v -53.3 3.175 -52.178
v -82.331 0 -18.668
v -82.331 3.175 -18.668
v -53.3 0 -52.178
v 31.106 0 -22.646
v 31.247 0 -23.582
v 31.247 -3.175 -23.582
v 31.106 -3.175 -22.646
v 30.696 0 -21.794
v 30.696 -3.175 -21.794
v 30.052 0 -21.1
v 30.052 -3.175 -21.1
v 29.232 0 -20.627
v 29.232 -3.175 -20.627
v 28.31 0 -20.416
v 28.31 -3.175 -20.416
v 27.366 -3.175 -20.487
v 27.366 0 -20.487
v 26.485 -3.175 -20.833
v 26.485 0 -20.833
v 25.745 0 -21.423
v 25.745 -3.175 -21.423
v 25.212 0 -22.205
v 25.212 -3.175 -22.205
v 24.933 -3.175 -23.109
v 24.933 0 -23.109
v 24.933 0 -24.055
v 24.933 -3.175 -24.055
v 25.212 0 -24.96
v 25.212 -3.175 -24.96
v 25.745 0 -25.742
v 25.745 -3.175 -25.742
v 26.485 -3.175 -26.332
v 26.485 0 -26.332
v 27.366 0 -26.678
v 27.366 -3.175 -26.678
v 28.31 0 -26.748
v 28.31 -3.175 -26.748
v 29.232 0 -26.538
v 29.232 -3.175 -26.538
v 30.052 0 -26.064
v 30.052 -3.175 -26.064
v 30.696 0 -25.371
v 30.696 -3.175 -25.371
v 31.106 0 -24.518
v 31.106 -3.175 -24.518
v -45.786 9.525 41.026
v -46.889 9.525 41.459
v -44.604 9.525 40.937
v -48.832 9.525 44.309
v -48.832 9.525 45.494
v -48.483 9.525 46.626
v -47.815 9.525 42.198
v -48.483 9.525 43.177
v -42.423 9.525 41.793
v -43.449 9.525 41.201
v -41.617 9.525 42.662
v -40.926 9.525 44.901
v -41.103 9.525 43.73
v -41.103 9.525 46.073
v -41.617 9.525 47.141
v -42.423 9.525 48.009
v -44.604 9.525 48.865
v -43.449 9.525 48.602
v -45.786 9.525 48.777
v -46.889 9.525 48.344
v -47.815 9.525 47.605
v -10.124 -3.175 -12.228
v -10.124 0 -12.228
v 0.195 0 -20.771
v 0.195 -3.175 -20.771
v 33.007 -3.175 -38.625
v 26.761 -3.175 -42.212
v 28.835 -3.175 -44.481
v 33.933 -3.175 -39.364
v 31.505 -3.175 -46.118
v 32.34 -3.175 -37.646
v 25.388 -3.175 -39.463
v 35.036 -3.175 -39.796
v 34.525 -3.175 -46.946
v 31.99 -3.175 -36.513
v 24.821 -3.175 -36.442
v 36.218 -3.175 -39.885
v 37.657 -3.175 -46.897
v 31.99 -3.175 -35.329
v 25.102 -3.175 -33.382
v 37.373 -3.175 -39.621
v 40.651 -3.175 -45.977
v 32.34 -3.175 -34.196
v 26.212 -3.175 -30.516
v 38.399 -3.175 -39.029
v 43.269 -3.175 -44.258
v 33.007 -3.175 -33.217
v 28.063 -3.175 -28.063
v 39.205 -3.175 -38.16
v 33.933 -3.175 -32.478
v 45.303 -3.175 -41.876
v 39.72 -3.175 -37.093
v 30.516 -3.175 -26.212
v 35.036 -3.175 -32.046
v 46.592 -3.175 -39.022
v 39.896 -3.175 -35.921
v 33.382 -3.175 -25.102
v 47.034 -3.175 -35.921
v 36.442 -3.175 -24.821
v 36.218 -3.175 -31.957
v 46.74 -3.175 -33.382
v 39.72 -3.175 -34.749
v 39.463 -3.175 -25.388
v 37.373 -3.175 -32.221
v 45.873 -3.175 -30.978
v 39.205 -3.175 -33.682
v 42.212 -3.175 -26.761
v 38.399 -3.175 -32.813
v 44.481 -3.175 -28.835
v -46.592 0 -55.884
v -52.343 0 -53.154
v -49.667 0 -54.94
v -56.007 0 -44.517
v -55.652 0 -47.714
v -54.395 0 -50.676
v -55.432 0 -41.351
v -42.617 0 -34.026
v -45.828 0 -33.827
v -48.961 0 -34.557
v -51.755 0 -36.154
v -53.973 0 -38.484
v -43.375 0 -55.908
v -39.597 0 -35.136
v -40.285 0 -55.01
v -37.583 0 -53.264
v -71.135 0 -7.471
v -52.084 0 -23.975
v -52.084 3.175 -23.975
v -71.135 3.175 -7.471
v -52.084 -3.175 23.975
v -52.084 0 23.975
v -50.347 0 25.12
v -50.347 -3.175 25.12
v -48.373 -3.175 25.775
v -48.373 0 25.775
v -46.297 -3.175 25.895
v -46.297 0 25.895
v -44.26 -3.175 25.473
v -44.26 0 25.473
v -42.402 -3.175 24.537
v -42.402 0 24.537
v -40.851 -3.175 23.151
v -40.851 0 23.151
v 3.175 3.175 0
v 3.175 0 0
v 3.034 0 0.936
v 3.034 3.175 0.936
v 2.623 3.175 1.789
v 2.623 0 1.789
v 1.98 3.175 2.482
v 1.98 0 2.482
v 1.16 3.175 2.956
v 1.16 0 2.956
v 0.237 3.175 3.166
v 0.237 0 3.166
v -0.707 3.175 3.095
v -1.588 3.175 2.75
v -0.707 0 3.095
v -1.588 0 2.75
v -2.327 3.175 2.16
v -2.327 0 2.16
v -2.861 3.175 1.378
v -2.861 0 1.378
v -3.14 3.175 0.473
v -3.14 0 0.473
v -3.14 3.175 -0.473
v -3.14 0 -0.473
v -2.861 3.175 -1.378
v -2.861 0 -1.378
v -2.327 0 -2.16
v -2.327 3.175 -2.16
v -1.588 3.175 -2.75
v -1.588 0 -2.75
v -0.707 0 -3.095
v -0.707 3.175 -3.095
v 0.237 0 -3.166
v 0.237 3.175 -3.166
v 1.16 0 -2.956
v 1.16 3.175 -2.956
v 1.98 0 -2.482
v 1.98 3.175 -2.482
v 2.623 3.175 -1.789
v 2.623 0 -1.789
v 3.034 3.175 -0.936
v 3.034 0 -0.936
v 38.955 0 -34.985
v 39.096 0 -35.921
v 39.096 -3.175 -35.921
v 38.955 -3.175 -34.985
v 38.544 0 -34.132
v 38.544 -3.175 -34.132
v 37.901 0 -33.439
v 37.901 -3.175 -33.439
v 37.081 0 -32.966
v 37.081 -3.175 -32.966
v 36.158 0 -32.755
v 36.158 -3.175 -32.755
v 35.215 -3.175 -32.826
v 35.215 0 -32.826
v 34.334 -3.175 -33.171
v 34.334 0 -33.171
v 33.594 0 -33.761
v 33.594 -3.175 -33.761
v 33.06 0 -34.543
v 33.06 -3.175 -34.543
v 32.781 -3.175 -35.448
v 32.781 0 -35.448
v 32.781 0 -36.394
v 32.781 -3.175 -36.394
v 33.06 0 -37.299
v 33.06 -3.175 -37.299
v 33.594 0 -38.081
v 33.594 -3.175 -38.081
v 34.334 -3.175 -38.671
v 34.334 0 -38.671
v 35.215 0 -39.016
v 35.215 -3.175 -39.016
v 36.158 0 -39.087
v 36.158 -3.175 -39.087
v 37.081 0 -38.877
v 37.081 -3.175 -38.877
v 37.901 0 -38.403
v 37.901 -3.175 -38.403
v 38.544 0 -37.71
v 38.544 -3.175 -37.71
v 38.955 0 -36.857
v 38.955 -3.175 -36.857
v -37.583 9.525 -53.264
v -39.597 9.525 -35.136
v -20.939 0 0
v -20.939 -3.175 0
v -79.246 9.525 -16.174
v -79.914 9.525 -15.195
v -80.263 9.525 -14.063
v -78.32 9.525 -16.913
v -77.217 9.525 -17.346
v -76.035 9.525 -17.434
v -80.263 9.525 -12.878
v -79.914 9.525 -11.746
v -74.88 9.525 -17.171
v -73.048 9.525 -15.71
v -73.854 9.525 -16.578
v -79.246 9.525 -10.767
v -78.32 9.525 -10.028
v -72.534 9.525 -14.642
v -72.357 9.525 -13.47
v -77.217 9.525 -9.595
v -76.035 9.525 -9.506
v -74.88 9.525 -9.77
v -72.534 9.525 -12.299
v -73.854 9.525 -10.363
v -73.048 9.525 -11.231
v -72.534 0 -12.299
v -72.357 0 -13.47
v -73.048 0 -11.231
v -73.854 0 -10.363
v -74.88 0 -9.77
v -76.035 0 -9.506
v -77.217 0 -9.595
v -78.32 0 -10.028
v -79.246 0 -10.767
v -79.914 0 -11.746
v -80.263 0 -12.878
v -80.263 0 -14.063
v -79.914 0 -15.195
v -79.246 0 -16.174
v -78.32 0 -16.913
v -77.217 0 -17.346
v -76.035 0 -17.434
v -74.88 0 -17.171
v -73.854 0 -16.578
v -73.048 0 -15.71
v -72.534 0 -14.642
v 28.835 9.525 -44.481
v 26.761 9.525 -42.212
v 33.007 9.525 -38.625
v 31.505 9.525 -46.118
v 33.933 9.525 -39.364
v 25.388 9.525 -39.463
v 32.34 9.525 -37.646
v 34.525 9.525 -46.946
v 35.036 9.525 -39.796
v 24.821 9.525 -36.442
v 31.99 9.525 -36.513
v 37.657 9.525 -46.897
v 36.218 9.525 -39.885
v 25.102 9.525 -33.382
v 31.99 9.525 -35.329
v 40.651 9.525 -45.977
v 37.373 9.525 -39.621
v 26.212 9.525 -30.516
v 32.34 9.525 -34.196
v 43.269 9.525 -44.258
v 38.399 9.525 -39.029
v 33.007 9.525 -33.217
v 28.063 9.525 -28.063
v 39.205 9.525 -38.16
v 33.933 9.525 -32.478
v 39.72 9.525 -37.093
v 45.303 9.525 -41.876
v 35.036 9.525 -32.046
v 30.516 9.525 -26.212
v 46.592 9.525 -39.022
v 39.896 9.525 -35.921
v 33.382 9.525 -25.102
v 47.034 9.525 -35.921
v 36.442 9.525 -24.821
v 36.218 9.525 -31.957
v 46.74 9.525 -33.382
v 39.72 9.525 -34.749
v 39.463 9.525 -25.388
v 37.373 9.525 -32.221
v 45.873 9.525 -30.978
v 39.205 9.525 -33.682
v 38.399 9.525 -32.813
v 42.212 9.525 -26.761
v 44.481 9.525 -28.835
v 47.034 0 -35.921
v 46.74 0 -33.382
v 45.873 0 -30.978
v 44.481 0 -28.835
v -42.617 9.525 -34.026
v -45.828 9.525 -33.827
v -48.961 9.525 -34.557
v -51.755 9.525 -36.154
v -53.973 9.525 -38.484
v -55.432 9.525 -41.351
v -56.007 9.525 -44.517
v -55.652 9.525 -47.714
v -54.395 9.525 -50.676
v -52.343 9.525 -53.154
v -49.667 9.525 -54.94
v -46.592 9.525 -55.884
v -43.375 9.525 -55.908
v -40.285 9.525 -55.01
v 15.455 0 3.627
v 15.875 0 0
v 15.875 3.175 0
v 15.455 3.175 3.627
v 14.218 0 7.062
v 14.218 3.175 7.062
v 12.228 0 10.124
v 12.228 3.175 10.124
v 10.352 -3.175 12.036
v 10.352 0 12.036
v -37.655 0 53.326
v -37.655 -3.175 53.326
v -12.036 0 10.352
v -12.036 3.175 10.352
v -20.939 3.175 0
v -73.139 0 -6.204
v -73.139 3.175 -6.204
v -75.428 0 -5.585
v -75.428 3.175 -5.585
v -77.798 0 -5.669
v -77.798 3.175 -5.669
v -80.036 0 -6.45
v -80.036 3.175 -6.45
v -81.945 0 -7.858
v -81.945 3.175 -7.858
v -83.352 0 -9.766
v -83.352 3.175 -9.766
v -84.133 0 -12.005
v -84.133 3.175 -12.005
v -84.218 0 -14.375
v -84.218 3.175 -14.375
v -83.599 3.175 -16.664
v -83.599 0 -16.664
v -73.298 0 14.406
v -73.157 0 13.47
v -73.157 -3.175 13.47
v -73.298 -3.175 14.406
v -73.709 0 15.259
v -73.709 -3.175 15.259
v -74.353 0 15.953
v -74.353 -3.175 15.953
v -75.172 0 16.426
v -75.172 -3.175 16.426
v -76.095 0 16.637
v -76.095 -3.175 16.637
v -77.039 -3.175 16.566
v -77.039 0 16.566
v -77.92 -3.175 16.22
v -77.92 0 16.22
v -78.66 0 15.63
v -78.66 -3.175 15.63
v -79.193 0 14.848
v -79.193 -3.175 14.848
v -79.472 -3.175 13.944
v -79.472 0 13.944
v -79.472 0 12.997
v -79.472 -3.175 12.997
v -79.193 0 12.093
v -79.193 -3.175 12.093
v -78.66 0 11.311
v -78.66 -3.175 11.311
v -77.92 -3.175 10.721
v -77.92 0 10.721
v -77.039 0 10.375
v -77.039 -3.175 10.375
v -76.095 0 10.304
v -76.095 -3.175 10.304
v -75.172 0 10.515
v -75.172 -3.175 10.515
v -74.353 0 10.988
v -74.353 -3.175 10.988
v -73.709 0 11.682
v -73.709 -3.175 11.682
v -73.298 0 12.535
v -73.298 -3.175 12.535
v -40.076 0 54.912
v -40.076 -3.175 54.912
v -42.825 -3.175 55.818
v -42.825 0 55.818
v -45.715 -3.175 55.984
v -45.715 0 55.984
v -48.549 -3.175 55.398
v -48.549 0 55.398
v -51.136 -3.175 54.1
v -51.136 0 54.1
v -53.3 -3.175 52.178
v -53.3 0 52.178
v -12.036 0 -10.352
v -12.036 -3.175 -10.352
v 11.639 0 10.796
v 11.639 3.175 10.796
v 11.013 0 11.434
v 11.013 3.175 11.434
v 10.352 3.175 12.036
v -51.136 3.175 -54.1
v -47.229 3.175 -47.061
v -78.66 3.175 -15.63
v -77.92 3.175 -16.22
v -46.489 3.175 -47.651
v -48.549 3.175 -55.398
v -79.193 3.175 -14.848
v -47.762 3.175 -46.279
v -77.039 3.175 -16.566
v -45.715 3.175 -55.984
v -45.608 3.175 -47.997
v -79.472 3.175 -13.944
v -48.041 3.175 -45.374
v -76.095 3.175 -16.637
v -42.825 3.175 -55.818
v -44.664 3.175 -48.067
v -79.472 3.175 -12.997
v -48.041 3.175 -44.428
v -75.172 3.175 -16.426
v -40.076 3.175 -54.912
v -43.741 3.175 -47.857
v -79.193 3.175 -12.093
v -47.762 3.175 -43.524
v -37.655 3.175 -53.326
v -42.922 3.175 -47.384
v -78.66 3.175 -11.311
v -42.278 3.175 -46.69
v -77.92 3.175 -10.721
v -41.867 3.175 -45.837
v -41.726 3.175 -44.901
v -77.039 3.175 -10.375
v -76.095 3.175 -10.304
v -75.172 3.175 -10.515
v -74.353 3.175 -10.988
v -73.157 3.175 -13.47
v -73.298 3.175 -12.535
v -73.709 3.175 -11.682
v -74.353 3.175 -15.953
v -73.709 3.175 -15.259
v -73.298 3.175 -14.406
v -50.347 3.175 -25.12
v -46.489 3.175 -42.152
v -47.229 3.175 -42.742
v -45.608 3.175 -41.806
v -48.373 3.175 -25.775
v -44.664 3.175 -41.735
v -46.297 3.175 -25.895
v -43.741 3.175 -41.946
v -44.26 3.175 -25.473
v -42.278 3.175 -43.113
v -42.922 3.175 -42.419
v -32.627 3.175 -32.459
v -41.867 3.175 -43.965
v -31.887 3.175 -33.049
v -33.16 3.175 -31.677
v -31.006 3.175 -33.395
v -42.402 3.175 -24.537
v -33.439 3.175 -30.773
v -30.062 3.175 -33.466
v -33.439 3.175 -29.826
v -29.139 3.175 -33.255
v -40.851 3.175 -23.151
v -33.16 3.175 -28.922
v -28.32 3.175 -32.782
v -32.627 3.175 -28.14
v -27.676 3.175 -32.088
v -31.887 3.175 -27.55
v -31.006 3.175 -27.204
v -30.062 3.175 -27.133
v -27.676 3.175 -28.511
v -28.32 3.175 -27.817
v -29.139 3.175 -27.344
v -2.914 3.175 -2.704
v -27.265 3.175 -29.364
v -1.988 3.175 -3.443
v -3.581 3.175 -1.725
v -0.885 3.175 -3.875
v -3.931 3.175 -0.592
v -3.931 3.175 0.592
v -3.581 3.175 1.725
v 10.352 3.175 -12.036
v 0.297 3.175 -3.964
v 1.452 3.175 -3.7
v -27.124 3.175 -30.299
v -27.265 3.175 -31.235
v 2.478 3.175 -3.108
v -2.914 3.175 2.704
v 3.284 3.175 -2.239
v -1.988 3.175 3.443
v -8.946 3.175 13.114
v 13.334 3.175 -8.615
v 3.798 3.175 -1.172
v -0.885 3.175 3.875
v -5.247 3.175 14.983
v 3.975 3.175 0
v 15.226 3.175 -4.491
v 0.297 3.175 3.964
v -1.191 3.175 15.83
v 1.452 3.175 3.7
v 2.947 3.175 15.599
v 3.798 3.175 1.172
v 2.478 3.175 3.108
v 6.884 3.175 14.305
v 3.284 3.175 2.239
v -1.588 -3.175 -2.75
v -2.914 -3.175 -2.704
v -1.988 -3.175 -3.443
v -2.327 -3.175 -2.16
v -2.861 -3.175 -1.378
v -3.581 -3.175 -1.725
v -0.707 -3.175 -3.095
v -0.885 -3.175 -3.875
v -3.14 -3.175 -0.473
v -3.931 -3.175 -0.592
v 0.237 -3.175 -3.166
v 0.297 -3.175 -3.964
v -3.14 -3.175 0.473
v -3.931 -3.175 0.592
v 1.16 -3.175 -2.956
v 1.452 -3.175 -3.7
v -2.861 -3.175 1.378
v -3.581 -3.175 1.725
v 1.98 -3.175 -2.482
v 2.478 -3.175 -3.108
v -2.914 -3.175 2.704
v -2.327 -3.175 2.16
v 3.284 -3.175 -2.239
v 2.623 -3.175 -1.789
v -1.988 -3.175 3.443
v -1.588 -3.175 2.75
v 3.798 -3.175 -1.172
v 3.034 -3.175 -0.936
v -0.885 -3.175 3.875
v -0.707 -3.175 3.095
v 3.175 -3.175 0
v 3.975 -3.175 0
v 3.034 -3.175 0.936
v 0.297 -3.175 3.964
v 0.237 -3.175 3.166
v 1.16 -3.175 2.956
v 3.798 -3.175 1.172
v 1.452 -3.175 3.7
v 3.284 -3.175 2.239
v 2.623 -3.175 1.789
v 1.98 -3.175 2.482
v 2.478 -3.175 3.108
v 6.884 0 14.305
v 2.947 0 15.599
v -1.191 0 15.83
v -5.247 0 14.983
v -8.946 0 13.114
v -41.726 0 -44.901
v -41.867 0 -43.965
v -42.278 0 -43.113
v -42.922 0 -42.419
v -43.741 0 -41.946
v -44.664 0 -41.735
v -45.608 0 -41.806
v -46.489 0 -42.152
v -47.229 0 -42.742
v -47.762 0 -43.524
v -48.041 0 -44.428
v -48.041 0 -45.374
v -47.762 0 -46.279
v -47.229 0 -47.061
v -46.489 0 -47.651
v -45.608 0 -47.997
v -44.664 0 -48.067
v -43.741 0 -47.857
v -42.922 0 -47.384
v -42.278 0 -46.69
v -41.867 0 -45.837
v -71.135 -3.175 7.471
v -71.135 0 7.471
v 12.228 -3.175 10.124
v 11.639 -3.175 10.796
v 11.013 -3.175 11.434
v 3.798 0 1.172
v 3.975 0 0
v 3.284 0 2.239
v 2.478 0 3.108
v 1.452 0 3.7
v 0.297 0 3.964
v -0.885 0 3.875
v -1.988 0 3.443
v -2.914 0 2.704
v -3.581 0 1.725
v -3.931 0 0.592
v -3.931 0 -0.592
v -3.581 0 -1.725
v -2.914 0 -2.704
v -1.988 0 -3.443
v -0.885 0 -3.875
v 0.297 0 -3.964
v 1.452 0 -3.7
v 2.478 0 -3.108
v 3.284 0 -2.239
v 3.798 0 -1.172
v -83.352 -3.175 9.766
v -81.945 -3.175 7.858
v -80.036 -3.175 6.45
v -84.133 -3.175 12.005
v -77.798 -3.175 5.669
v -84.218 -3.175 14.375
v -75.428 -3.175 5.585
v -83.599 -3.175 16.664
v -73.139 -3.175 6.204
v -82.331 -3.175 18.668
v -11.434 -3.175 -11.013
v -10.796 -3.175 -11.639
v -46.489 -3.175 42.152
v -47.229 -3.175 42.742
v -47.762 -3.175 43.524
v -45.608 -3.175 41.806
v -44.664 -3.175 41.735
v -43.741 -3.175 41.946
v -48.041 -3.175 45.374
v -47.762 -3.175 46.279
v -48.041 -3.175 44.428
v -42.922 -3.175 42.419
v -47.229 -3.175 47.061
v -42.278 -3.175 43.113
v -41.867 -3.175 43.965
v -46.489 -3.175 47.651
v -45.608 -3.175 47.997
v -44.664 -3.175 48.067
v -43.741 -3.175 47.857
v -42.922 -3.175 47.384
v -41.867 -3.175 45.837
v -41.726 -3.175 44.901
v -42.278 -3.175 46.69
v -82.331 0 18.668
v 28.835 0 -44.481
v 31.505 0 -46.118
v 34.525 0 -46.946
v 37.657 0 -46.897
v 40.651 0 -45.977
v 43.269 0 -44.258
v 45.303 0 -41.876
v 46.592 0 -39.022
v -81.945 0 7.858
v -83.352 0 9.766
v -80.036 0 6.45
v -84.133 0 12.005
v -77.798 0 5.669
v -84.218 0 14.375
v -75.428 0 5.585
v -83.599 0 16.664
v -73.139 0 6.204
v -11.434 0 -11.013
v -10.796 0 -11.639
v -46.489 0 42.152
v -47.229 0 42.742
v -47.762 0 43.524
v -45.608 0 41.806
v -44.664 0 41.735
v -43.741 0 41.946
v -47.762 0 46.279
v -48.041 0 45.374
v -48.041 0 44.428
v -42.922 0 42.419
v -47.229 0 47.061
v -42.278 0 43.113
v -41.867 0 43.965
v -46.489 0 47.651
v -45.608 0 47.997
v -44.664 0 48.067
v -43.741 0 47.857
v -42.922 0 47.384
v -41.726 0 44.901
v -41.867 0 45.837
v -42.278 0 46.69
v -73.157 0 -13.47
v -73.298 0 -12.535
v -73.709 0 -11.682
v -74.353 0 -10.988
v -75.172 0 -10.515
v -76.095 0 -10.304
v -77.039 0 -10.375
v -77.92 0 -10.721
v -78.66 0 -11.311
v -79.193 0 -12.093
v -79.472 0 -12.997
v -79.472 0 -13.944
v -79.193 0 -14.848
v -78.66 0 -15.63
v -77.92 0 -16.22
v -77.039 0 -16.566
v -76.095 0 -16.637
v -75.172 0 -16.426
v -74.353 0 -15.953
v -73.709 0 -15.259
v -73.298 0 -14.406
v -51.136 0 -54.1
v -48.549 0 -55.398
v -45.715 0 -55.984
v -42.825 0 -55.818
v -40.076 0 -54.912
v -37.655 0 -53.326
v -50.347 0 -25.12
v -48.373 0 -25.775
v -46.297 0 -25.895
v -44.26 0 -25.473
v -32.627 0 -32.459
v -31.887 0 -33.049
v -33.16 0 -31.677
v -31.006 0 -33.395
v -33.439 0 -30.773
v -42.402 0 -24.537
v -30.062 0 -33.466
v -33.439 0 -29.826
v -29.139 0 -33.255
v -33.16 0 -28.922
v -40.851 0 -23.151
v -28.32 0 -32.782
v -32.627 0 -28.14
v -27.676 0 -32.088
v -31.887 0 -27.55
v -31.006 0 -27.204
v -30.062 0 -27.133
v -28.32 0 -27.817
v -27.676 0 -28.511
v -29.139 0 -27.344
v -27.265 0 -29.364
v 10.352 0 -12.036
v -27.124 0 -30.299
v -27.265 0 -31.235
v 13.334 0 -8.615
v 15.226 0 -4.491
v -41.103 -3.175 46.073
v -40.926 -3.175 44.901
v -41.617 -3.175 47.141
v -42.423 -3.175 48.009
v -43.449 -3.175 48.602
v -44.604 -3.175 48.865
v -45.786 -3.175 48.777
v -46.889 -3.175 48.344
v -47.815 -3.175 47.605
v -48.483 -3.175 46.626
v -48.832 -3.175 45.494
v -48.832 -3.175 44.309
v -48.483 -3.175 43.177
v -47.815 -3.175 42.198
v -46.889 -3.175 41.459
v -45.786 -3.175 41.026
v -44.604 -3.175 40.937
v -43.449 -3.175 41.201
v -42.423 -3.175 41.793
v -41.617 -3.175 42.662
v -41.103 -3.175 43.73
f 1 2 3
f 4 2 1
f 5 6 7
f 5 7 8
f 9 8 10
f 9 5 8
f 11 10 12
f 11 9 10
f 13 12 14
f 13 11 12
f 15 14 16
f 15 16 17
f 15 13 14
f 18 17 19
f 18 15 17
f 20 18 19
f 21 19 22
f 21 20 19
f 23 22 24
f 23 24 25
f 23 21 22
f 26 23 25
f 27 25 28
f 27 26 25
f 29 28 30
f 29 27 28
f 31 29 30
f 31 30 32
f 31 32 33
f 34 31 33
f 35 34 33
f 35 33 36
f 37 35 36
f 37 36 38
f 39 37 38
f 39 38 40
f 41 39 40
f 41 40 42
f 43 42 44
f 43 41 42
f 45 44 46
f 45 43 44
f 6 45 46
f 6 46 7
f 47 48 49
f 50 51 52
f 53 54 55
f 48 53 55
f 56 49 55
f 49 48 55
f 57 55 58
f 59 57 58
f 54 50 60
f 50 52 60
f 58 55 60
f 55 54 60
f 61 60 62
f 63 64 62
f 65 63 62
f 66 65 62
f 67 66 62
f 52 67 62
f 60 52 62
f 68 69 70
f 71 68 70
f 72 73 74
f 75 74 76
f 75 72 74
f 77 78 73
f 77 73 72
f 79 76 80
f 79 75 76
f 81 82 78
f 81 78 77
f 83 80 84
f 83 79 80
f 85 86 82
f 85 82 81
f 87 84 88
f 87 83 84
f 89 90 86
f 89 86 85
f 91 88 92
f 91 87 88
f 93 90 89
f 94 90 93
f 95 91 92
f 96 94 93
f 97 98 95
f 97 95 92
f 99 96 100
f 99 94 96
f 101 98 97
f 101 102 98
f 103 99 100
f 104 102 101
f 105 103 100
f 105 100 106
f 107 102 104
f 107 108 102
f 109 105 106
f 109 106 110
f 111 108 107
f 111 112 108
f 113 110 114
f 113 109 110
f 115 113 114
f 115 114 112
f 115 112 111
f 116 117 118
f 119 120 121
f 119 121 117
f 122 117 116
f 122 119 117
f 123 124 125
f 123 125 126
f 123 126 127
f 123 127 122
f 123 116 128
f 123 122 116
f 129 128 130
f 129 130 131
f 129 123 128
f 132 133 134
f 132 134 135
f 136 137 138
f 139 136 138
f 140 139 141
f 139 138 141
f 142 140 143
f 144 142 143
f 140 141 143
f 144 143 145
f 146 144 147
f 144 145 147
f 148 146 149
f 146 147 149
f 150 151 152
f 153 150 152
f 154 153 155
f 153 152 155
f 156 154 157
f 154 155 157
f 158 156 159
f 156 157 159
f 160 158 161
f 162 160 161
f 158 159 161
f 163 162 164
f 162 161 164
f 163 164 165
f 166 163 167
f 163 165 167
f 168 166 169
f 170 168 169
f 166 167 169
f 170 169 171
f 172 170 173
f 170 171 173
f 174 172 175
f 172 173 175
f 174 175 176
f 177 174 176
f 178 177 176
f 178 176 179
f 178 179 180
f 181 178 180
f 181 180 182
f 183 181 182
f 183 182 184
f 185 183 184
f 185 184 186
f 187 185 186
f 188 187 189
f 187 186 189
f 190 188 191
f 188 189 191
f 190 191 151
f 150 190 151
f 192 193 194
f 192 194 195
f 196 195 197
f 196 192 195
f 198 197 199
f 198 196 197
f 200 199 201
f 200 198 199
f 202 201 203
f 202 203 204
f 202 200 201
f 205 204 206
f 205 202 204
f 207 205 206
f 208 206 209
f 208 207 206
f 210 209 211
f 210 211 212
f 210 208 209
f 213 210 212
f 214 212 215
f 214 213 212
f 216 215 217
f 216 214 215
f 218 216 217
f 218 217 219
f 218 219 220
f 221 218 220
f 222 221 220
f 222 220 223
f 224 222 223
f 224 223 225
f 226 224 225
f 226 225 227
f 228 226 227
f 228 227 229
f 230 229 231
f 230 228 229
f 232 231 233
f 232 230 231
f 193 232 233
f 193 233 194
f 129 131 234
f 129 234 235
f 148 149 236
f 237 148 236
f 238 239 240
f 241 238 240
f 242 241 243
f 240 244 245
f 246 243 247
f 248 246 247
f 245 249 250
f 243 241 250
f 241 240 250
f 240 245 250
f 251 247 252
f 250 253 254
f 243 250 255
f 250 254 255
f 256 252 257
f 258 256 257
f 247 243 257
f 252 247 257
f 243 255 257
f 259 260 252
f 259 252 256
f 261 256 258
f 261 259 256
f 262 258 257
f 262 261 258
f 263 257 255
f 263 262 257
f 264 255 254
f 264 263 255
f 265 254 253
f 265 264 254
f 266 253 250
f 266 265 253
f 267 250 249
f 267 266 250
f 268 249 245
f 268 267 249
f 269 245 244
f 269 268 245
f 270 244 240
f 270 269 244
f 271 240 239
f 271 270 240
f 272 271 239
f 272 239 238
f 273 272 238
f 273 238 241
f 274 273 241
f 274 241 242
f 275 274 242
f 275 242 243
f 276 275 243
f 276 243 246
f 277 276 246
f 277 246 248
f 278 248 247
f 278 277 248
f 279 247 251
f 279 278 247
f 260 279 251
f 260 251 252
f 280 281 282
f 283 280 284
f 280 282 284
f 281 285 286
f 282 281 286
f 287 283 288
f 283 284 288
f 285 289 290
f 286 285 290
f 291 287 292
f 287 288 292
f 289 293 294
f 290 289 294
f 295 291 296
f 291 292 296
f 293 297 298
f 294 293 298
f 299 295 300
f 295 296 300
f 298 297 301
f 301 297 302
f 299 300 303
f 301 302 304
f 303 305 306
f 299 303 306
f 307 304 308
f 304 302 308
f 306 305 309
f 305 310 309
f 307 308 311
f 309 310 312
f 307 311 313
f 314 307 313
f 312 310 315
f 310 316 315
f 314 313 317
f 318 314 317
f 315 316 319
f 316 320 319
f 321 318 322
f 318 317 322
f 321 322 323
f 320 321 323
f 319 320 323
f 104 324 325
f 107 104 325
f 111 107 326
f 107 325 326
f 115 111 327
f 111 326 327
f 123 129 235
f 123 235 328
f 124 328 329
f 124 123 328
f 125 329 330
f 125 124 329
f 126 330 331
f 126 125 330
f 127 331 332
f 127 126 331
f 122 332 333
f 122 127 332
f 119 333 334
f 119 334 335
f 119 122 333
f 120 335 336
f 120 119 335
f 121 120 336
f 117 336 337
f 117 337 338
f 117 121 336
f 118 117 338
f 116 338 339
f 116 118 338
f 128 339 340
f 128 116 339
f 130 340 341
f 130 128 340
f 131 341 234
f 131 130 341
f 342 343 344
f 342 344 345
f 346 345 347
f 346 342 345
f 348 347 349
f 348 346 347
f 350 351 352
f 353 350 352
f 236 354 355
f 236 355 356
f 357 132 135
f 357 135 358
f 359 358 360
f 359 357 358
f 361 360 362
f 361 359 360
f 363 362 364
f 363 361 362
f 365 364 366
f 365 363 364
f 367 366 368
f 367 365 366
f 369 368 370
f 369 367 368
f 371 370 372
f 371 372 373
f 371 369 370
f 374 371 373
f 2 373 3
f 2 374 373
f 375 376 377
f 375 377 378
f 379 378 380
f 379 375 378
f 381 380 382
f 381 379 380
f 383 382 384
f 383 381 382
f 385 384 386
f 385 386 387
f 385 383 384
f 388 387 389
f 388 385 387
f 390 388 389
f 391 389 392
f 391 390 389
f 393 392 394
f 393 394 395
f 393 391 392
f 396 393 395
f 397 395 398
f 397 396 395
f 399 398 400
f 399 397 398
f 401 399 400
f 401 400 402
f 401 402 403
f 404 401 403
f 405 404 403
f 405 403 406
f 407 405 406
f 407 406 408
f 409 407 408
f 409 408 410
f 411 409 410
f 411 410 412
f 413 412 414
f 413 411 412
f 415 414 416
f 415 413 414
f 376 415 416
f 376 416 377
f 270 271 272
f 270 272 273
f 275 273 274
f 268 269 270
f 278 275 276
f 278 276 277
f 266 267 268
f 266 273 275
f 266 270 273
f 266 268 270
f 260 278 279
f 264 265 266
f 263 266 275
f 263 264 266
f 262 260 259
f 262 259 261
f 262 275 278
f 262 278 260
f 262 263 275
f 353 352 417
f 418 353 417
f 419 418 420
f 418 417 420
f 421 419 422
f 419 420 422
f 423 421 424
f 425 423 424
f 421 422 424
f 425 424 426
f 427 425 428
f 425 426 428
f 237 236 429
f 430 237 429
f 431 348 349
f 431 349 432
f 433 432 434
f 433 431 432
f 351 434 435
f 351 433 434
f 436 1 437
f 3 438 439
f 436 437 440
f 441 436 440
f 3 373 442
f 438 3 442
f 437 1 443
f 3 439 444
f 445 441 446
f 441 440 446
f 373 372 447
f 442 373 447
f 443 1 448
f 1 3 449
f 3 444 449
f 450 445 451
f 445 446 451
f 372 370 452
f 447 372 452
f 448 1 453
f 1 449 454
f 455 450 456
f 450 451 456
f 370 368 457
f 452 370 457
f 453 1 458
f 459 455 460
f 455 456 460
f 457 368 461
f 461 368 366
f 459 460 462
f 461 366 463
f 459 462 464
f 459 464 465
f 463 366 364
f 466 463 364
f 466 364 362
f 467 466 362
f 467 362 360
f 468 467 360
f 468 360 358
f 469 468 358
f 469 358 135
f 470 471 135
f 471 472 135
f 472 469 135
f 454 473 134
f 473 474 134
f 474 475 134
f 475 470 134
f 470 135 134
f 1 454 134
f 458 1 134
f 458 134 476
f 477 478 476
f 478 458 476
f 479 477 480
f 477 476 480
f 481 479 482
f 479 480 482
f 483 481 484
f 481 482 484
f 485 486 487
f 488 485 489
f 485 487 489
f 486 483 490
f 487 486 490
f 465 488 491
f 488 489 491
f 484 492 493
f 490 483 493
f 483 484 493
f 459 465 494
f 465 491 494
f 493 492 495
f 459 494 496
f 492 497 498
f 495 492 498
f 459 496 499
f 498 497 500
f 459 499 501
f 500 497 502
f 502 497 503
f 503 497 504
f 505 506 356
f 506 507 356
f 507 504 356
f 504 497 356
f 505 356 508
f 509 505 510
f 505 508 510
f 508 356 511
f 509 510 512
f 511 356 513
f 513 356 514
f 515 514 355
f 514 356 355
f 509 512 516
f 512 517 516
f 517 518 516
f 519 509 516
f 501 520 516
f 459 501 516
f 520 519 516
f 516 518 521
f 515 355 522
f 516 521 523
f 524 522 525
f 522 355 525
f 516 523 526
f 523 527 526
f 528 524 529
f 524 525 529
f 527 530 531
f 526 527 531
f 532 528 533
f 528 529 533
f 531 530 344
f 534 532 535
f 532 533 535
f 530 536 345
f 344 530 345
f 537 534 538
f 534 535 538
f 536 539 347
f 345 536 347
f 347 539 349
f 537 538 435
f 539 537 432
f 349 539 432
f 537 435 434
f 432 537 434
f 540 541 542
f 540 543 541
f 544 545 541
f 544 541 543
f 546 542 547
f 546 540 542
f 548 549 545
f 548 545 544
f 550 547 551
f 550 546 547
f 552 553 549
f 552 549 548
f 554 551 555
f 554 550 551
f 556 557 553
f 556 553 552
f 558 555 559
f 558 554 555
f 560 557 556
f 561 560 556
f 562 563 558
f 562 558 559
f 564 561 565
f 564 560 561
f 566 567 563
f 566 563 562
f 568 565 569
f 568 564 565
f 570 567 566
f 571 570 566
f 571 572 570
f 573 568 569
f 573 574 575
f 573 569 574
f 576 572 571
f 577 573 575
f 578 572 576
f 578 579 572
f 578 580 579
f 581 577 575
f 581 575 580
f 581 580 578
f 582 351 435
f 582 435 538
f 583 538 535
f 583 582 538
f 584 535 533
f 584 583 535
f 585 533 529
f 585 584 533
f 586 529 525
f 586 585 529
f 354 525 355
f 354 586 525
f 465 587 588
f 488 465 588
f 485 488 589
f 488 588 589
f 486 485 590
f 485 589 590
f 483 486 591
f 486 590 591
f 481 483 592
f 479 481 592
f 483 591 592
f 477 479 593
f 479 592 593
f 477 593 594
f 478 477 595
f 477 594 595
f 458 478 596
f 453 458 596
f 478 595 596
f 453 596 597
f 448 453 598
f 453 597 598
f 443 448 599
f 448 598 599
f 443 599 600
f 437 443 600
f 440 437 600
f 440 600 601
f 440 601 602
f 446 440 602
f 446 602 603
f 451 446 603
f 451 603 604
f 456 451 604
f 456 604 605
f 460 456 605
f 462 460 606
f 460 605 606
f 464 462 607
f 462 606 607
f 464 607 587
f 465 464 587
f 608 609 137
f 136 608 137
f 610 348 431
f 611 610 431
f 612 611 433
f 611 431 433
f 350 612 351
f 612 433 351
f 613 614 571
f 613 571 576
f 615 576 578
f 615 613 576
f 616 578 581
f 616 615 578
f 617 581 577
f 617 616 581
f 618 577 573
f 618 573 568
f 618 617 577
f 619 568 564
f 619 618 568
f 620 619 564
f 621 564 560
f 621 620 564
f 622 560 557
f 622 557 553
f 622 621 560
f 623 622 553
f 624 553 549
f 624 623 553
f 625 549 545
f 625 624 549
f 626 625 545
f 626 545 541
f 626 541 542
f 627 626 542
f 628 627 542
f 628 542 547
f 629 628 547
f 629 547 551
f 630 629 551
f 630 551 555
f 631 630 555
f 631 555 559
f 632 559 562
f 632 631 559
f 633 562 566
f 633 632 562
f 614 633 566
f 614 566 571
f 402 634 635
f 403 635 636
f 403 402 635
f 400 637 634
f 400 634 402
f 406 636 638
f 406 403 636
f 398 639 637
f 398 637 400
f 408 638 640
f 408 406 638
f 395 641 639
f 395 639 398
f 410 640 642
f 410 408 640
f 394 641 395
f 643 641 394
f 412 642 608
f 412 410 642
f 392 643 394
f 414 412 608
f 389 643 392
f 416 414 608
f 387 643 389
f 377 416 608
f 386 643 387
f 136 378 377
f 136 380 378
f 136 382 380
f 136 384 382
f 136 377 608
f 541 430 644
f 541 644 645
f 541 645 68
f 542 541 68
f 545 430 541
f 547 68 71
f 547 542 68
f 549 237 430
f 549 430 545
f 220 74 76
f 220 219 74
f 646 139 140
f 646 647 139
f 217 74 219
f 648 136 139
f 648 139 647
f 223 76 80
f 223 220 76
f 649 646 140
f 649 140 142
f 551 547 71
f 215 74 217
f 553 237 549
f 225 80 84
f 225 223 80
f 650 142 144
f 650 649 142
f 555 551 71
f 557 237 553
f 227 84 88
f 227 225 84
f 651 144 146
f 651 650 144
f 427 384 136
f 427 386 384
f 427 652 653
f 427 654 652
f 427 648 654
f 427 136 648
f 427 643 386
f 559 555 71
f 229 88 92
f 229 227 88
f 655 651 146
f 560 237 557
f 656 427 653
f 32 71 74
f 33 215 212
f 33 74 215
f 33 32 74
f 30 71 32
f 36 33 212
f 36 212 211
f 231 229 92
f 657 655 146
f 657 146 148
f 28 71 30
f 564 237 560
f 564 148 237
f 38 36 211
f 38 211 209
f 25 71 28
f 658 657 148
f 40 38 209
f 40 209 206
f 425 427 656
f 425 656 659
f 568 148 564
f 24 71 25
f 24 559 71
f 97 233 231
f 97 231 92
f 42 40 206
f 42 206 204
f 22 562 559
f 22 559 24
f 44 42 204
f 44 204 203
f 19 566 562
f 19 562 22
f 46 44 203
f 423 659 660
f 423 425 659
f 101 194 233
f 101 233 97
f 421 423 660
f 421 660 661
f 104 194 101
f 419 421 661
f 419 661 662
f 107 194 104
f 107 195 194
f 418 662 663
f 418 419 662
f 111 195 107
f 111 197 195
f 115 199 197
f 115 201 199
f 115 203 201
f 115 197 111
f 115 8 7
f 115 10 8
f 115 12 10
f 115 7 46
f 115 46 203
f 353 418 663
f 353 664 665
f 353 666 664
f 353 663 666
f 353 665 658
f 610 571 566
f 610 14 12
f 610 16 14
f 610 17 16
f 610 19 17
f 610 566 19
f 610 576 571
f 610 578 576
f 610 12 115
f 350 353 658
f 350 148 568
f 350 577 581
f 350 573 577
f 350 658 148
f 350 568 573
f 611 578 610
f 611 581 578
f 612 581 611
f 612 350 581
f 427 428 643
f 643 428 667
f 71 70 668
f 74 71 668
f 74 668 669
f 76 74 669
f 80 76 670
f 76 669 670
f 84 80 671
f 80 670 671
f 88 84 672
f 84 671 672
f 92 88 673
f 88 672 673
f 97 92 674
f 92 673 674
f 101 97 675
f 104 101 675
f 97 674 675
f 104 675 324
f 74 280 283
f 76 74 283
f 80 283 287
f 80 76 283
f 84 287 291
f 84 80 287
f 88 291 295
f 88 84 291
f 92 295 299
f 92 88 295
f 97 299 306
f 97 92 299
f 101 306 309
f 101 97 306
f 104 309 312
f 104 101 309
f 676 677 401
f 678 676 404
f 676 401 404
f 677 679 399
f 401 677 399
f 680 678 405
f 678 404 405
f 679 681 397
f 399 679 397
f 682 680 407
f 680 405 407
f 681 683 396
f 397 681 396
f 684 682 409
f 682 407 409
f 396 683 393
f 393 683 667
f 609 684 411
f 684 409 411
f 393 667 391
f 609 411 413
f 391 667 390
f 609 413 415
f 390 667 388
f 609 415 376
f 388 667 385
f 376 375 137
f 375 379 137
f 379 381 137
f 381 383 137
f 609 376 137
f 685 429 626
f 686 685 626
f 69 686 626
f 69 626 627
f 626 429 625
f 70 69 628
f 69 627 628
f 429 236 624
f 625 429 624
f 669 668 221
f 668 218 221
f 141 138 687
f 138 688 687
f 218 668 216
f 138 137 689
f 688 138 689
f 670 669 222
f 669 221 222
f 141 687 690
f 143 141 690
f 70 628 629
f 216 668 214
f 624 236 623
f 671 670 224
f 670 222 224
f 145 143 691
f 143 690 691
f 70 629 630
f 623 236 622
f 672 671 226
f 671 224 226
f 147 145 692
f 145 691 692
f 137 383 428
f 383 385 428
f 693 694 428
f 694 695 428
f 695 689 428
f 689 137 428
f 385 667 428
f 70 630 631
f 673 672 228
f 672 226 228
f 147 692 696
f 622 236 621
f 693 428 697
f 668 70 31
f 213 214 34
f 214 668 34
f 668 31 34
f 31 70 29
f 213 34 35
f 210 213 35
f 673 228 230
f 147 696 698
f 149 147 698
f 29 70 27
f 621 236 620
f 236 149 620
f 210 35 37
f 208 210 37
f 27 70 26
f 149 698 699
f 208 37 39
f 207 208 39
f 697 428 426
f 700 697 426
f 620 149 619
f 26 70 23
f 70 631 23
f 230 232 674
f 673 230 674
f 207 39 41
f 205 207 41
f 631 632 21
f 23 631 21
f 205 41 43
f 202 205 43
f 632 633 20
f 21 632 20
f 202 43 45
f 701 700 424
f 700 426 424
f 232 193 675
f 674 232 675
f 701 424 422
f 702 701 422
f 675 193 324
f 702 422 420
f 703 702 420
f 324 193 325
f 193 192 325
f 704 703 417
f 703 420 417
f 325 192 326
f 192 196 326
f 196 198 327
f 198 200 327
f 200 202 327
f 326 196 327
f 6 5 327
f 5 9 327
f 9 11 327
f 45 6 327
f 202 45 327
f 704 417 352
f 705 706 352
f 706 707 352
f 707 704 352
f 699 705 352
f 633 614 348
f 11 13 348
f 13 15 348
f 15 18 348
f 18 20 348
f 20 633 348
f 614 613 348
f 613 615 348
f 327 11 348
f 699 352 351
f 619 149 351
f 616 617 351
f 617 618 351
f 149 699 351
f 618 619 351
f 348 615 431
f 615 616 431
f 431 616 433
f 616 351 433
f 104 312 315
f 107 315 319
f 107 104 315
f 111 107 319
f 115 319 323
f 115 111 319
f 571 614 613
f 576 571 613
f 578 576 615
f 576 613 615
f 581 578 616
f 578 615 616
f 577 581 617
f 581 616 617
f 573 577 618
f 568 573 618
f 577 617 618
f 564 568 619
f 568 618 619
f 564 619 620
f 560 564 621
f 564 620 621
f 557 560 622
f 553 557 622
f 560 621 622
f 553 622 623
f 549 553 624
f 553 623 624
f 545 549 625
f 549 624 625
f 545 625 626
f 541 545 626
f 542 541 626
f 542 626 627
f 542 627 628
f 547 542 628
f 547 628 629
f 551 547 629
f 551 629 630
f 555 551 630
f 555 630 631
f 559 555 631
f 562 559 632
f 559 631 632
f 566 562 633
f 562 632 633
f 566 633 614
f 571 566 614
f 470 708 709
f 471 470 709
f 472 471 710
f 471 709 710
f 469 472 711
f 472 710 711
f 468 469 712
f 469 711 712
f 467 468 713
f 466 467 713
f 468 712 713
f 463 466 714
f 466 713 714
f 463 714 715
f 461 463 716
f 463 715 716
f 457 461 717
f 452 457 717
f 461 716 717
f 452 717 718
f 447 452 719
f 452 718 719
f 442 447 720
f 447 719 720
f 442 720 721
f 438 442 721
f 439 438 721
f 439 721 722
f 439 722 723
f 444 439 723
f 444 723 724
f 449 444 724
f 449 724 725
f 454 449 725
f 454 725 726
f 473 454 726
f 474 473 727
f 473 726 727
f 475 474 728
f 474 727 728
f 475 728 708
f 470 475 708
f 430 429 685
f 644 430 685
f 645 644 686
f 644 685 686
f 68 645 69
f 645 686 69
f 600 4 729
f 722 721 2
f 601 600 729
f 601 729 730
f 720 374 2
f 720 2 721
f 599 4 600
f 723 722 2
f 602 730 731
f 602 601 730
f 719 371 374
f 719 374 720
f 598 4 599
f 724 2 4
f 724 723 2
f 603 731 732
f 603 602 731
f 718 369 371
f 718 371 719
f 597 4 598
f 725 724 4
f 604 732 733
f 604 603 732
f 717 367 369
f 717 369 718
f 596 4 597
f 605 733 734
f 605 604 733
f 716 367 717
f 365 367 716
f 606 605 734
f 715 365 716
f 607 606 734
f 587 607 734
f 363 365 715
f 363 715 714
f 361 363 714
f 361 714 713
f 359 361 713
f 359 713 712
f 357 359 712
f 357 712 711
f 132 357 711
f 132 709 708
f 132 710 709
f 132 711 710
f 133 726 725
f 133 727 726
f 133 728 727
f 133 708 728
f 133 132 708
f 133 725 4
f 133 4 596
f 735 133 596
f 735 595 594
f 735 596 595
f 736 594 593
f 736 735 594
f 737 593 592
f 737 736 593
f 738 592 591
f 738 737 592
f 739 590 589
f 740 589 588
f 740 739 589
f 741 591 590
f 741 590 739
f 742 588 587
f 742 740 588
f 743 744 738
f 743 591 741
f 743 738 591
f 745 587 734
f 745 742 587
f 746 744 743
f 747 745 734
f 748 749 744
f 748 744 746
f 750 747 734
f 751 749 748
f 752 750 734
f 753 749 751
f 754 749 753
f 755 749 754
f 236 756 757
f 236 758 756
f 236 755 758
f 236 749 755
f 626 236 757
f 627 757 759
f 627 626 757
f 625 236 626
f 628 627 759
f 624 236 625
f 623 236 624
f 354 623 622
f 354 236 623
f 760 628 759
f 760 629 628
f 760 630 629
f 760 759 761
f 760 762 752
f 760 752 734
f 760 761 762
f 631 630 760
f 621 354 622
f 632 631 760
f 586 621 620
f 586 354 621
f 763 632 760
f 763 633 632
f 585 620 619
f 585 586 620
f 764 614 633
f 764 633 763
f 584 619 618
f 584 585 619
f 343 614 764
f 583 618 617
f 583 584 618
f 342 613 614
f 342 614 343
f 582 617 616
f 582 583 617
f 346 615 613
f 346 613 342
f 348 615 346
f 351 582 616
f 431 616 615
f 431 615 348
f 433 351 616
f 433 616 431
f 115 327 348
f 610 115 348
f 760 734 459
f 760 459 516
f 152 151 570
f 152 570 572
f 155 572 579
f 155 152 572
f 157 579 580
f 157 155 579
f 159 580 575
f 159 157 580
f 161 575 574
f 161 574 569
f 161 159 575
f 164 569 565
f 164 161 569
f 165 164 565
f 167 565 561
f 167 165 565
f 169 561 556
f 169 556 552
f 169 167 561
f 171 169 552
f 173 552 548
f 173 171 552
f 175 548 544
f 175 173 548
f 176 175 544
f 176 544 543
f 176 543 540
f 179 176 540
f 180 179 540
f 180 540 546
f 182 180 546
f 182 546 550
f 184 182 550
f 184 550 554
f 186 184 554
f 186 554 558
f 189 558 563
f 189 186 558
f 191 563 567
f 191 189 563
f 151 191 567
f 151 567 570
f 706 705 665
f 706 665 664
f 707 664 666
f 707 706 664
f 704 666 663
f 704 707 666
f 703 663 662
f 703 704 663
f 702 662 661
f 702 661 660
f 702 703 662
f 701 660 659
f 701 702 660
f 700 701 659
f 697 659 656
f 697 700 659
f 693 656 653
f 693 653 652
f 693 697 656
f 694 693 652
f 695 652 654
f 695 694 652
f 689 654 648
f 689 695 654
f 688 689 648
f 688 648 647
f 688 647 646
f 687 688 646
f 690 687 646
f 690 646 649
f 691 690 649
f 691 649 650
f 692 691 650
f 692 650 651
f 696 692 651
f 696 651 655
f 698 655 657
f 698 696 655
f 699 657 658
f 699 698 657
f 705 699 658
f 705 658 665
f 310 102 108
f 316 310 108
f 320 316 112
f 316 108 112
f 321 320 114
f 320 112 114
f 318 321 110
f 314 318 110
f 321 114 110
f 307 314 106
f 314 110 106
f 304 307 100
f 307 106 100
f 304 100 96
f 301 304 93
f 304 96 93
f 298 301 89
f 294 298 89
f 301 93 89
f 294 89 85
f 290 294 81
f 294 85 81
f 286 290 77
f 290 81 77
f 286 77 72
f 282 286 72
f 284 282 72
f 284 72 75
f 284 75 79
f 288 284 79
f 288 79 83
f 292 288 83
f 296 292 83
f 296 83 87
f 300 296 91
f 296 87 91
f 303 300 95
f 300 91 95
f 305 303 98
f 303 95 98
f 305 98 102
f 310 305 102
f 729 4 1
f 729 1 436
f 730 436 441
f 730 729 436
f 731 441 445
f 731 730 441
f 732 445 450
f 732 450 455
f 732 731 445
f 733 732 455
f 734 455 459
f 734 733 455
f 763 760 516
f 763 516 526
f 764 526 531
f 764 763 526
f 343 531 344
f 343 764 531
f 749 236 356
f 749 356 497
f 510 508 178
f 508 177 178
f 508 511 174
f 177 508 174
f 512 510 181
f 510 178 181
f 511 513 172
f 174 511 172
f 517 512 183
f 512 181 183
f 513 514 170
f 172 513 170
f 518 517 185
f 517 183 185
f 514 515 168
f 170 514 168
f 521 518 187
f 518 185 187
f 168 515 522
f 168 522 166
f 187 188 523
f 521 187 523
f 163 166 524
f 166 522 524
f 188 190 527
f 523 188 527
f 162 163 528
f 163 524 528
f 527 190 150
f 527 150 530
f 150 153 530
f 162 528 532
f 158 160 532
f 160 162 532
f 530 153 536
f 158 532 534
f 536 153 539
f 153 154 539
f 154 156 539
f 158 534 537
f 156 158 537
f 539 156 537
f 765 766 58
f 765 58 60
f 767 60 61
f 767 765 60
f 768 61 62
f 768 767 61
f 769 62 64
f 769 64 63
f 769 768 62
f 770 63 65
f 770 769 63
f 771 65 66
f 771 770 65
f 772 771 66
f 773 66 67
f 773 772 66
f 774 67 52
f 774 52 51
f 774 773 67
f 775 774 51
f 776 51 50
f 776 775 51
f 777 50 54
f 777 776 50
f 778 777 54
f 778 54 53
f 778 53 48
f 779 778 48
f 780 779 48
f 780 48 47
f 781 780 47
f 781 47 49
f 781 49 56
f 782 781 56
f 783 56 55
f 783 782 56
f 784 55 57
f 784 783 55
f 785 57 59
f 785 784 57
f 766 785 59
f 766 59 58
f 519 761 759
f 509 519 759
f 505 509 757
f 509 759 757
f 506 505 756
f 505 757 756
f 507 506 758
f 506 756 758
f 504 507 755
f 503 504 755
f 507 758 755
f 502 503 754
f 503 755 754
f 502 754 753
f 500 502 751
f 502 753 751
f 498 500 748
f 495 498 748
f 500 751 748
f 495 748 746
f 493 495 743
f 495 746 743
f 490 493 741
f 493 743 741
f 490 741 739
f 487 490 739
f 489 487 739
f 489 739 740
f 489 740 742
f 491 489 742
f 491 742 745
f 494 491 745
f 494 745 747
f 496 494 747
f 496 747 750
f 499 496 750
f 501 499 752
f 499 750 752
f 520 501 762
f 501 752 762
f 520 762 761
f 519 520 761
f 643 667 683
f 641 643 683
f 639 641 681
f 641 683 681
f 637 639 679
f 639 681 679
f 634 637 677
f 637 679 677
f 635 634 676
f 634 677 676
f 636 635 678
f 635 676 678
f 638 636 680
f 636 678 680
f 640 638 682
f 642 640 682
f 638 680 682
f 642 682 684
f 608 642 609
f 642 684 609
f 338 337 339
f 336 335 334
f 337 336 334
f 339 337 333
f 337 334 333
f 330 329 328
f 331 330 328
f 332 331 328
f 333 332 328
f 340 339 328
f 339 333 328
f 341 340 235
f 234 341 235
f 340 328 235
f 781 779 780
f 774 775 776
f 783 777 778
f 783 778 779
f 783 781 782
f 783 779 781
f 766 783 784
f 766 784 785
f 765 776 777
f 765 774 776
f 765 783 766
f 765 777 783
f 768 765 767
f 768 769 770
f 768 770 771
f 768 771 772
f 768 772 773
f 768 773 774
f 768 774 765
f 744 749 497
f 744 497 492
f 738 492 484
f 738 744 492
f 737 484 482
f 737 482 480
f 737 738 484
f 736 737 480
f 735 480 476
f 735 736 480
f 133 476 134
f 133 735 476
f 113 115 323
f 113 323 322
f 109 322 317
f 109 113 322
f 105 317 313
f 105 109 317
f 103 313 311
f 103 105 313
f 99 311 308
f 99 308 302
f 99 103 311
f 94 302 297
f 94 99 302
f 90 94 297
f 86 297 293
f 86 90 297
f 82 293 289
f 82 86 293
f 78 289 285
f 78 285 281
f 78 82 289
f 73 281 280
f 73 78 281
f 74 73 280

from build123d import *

# Parameters (mm, degrees)
F0_R          = 3.175
F0_R_2        = 3.9751
F1_DEPTH      = 3.175
F2_DEPTH      = 3.175
F3_DEPTH      = 3.175
F3_DEPTH_BACK = 3.175
F4_R          = 3.9751
F4_R_2        = 3.175
F6_DEPTH      = 12.7
F7_START      = -3.175
F7_DEPTH      = 9.525


with BuildPart() as f1:
    # F0 (on Front) → F1 (new body)
    with BuildSketch(Plane.XZ):
        with BuildLine():
            ThreePointArc((-12.0356034274, 10.3518054047), (-1.190625, 15.8302885984), (10.3518054047, 12.0356034274))
            Line((10.3518054047, 12.0356034274), (-37.655016822, 53.3262030046))
            ThreePointArc((-37.655016822, 53.3262030046), (-34.8014845049, 49.5361241819), (-33.7887806053, 44.9012806053))
            ThreePointArc((-33.7887806053, 44.9012806053), (-41.0369756168, 34.4823169714), (-53.3262030046, 37.655016822))
            ThreePointArc((-53.3262030046, 37.655016822), (-56.0137627922, 44.9211777548), (-53.300199871, 52.1776678558))
            Line((-53.300199871, 52.1776678558), (-82.331405076, 18.6678036462))
            ThreePointArc((-82.331405076, 18.6678036462), (-73.5586383483, 20.9075469092), (-68.3946770291, 13.4703841816))
            ThreePointArc((-68.3946770291, 13.4703841816), (-69.1121208226, 10.1727039932), (-71.1347575644, 7.4711561347))
            Line((-71.1347575644, 7.4711561347), (-52.0843267669, 23.9754595323))
            ThreePointArc((-52.0843267669, 23.9754595323), (-46.2965222838, 25.8954961667), (-40.8511612346, 23.1508168672))
            Line((-40.8511612346, 23.1508168672), (-20.9391765456, 0))
            Line((-20.9391765456, 0), (-12.0356034274, 10.3518054047))
        make_face()
        with BuildLine():
            ThreePointArc((28.8345692365, -44.4808030019), (28.0633003783, -28.0633003783), (44.4808030019, -28.8345692365))
            Line((44.4808030019, -28.8345692365), (12.2282550252, 10.1235074968))
            ThreePointArc((12.2282550252, 10.1235074968), (14.9355142785, 5.3801522504), (15.875, 0))
            ThreePointArc((15.875, 0), (14.4282801435, -6.6212051093), (10.3518054047, -12.0356034274))
            Line((10.3518054047, -12.0356034274), (0.1954344954, -20.7710836138))
            Line((0.1954344954, -20.7710836138), (28.8345692365, -44.4808030019))
        make_face()
        with Locations((28.0722806345, -23.5821525739)):
            Circle(F0_R, mode=Mode.SUBTRACT)
        with BuildLine():
            ThreePointArc((15.875, 0), (14.9355142785, 5.3801522504), (12.2282550252, 10.1235074968))
            ThreePointArc((12.2282550252, 10.1235074968), (11.3304373246, 11.1192092809), (10.3518054047, 12.0356034274))
            ThreePointArc((10.3518054047, 12.0356034274), (-1.190625, 15.8302885984), (-12.0356034274, 10.3518054047))
            ThreePointArc((-12.0356034274, 10.3518054047), (-15.875, 0), (-12.0356034274, -10.3518054047))
            ThreePointArc((-12.0356034274, -10.3518054047), (-11.1192092809, -11.3304373246), (-10.1235074968, -12.2282550252))
            ThreePointArc((-10.1235074968, -12.2282550252), (0.1493607821, -15.87429735), (10.3518054047, -12.0356034274))
            ThreePointArc((10.3518054047, -12.0356034274), (14.4282801435, -6.6212051093), (15.875, 0))
        make_face()
        Circle(F0_R_2, mode=Mode.SUBTRACT)
        with BuildLine():
            Line((-10.1235074968, -12.2282550252), (0.1954344954, -20.7710836138))
            Line((0.1954344954, -20.7710836138), (10.3518054047, -12.0356034274))
            ThreePointArc((10.3518054047, -12.0356034274), (0.1493607821, -15.87429735), (-10.1235074968, -12.2282550252))
        make_face()
        with BuildLine():
            ThreePointArc((-12.0356034274, -10.3518054047), (-15.875, 0), (-12.0356034274, 10.3518054047))
            Line((-12.0356034274, 10.3518054047), (-20.9391765456, 0))
            Line((-20.9391765456, 0), (-12.0356034274, -10.3518054047))
        make_face()
        with BuildLine():
            ThreePointArc((-33.7887806053, 44.9012806053), (-34.8014845049, 49.5361241819), (-37.655016822, 53.3262030046))
            ThreePointArc((-37.655016822, 53.3262030046), (-45.7148756595, 55.9839571475), (-53.300199871, 52.1776678558))
            ThreePointArc((-53.300199871, 52.1776678558), (-56.0137627922, 44.9211777548), (-53.3262030046, 37.655016822))
            ThreePointArc((-53.3262030046, 37.655016822), (-41.0369756168, 34.4823169714), (-33.7887806053, 44.9012806053))
        make_face()
        with Locations((-44.9012806053, 44.9012806053)):
            Circle(F0_R, mode=Mode.SUBTRACT)
        with BuildLine():
            ThreePointArc((-68.3946770291, 13.4703841816), (-73.5586383483, 20.9075469092), (-82.331405076, 18.6678036462))
            ThreePointArc((-82.331405076, 18.6678036462), (-81.9448371048, 7.8577241059), (-71.1347575644, 7.4711561347))
            ThreePointArc((-71.1347575644, 7.4711561347), (-69.1121208226, 10.1727039932), (-68.3946770291, 13.4703841816))
        make_face()
        with Locations((-76.3321770291, 13.4703841816)):
            Circle(F0_R, mode=Mode.SUBTRACT)
        with BuildLine():
            ThreePointArc((28.8345692365, -44.4808030019), (40.650687385, -45.9767663811), (47.0335244843, -35.9210244843))
            ThreePointArc((47.0335244843, -35.9210244843), (46.3758844792, -32.154917909), (44.4808030019, -28.8345692365))
            ThreePointArc((44.4808030019, -28.8345692365), (28.0633003783, -28.0633003783), (28.8345692365, -44.4808030019))
        make_face()
        with Locations((35.9210244843, -35.9210244843)):
            Circle(F0_R, mode=Mode.SUBTRACT)
    extrude(amount=F1_DEPTH)


with BuildPart() as f2:
    # F0 (on Front) → F2 (new body)
    with BuildSketch(Plane.XZ):
        with BuildLine():
            Line((-37.655016822, -53.3262030046), (0.1954344954, -20.7710836138))
            Line((0.1954344954, -20.7710836138), (-10.1235074968, -12.2282550252))
            ThreePointArc((-10.1235074968, -12.2282550252), (-11.1192092809, -11.3304373246), (-12.0356034274, -10.3518054047))
            Line((-12.0356034274, -10.3518054047), (-20.9391765456, 0))
            Line((-20.9391765456, 0), (-40.8511612346, -23.1508168672))
            ThreePointArc((-40.8511612346, -23.1508168672), (-46.2965222838, -25.8954961667), (-52.0843267669, -23.9754595323))
            Line((-52.0843267669, -23.9754595323), (-71.1347575644, -7.4711561347))
            ThreePointArc((-71.1347575644, -7.4711561347), (-69.1121208226, -10.1727039932), (-68.3946770291, -13.4703841816))
            ThreePointArc((-68.3946770291, -13.4703841816), (-73.5586383483, -20.9075469092), (-82.331405076, -18.6678036462))
            Line((-82.331405076, -18.6678036462), (-53.300199871, -52.1776678558))
            ThreePointArc((-53.300199871, -52.1776678558), (-56.0137627922, -44.9211777548), (-53.3262030046, -37.655016822))
            ThreePointArc((-53.3262030046, -37.655016822), (-41.0369756168, -34.4823169714), (-33.7887806053, -44.9012806053))
            ThreePointArc((-33.7887806053, -44.9012806053), (-34.8014845049, -49.5361241819), (-37.655016822, -53.3262030046))
        make_face()
        with Locations((-30.2993841525, -30.2993841525)):
            Circle(F0_R, mode=Mode.SUBTRACT)
        with BuildLine():
            ThreePointArc((-12.0356034274, -10.3518054047), (-15.875, 0), (-12.0356034274, 10.3518054047))
            Line((-12.0356034274, 10.3518054047), (-20.9391765456, 0))
            Line((-20.9391765456, 0), (-12.0356034274, -10.3518054047))
        make_face()
        with BuildLine():
            ThreePointArc((15.875, 0), (14.9355142785, 5.3801522504), (12.2282550252, 10.1235074968))
            ThreePointArc((12.2282550252, 10.1235074968), (11.3304373246, 11.1192092809), (10.3518054047, 12.0356034274))
            ThreePointArc((10.3518054047, 12.0356034274), (-1.190625, 15.8302885984), (-12.0356034274, 10.3518054047))
            ThreePointArc((-12.0356034274, 10.3518054047), (-15.875, 0), (-12.0356034274, -10.3518054047))
            ThreePointArc((-12.0356034274, -10.3518054047), (-11.1192092809, -11.3304373246), (-10.1235074968, -12.2282550252))
            ThreePointArc((-10.1235074968, -12.2282550252), (0.1493607821, -15.87429735), (10.3518054047, -12.0356034274))
            ThreePointArc((10.3518054047, -12.0356034274), (14.4282801435, -6.6212051093), (15.875, 0))
        make_face()
        Circle(F0_R_2, mode=Mode.SUBTRACT)
        with BuildLine():
            ThreePointArc((-53.300199871, -52.1776678558), (-45.7148756595, -55.9839571475), (-37.655016822, -53.3262030046))
            ThreePointArc((-37.655016822, -53.3262030046), (-34.8014845049, -49.5361241819), (-33.7887806053, -44.9012806053))
            ThreePointArc((-33.7887806053, -44.9012806053), (-41.0369756168, -34.4823169714), (-53.3262030046, -37.655016822))
            ThreePointArc((-53.3262030046, -37.655016822), (-56.0137627922, -44.9211777548), (-53.300199871, -52.1776678558))
        make_face()
        with Locations((-44.9012806053, -44.9012806053)):
            Circle(F0_R, mode=Mode.SUBTRACT)
        with BuildLine():
            ThreePointArc((-71.1347575644, -7.4711561347), (-81.9448371048, -7.8577241059), (-82.331405076, -18.6678036462))
            ThreePointArc((-82.331405076, -18.6678036462), (-73.5586383483, -20.9075469092), (-68.3946770291, -13.4703841816))
            ThreePointArc((-68.3946770291, -13.4703841816), (-69.1121208226, -10.1727039932), (-71.1347575644, -7.4711561347))
        make_face()
        with Locations((-76.3321770291, -13.4703841816)):
            Circle(F0_R, mode=Mode.SUBTRACT)
        with BuildLine():
            Line((-10.1235074968, -12.2282550252), (0.1954344954, -20.7710836138))
            Line((0.1954344954, -20.7710836138), (10.3518054047, -12.0356034274))
            ThreePointArc((10.3518054047, -12.0356034274), (0.1493607821, -15.87429735), (-10.1235074968, -12.2282550252))
        make_face()
    extrude(amount=-F2_DEPTH)

    # F0 (on Front) → F3 (join, two sides)
    with BuildSketch(Plane.XZ) as f3_sk:
        Circle(F0_R_2)
        Circle(F0_R, mode=Mode.SUBTRACT)
    extrude(amount=F3_DEPTH)
    extrude(f3_sk.sketch, amount=-F3_DEPTH_BACK)


with BuildPart() as f6:
    # F4 (on face) → F6 (new body, through all)
    with BuildSketch(Plane.XZ.offset(3.175)):
        with Locations((-44.9012806053, 44.9012806053)):
            Circle(F4_R)
        with Locations((-44.9012806053, 44.9012806053)):
            Circle(F4_R_2, mode=Mode.SUBTRACT)
        with Locations((-44.9012806053, 44.9012806053)):
            Circle(F4_R_2)
    extrude(amount=-F6_DEPTH)


with BuildPart() as f6b:
    # F4 (on face) → F6, piece 2 (new body, through all)
    with BuildSketch(Plane.XZ.offset(3.175)):
        with BuildLine():
            ThreePointArc((28.8345692365, -44.4808030019), (40.650687385, -45.9767663811), (47.0335244843, -35.9210244843))
            ThreePointArc((47.0335244843, -35.9210244843), (46.3758844792, -32.154917909), (44.4808030019, -28.8345692365))
            ThreePointArc((44.4808030019, -28.8345692365), (28.0633003783, -28.0633003783), (28.8345692365, -44.4808030019))
        make_face()
        with Locations((35.9210244843, -35.9210244843)):
            Circle(F4_R, mode=Mode.SUBTRACT)
    extrude(amount=-F6_DEPTH)


with BuildPart() as f7:
    # F4 (on face) → F7 (new body)
    with BuildSketch(Plane.XZ.offset(3.175).offset(F7_START)):
        with BuildLine():
            Line((-37.5830393389, -53.2637563761), (-39.5971984414, -35.1363244535))
            ThreePointArc((-39.5971984414, -35.1363244535), (-55.9458136069, -46.1284509389), (-37.5830393389, -53.2637563761))
        make_face()
    extrude(amount=-F7_DEPTH)


with BuildPart() as f7b:
    # F4 (on face) → F7, piece 2 (new body)
    with BuildSketch(Plane.XZ.offset(3.175).offset(F7_START)):
        with Locations((-76.3321770291, -13.4703841816)):
            Circle(F4_R)
    extrude(amount=-F7_DEPTH)


solid = Compound([f1.part, f2.part, f6.part, f6b.part, f7.part, f7b.part])
